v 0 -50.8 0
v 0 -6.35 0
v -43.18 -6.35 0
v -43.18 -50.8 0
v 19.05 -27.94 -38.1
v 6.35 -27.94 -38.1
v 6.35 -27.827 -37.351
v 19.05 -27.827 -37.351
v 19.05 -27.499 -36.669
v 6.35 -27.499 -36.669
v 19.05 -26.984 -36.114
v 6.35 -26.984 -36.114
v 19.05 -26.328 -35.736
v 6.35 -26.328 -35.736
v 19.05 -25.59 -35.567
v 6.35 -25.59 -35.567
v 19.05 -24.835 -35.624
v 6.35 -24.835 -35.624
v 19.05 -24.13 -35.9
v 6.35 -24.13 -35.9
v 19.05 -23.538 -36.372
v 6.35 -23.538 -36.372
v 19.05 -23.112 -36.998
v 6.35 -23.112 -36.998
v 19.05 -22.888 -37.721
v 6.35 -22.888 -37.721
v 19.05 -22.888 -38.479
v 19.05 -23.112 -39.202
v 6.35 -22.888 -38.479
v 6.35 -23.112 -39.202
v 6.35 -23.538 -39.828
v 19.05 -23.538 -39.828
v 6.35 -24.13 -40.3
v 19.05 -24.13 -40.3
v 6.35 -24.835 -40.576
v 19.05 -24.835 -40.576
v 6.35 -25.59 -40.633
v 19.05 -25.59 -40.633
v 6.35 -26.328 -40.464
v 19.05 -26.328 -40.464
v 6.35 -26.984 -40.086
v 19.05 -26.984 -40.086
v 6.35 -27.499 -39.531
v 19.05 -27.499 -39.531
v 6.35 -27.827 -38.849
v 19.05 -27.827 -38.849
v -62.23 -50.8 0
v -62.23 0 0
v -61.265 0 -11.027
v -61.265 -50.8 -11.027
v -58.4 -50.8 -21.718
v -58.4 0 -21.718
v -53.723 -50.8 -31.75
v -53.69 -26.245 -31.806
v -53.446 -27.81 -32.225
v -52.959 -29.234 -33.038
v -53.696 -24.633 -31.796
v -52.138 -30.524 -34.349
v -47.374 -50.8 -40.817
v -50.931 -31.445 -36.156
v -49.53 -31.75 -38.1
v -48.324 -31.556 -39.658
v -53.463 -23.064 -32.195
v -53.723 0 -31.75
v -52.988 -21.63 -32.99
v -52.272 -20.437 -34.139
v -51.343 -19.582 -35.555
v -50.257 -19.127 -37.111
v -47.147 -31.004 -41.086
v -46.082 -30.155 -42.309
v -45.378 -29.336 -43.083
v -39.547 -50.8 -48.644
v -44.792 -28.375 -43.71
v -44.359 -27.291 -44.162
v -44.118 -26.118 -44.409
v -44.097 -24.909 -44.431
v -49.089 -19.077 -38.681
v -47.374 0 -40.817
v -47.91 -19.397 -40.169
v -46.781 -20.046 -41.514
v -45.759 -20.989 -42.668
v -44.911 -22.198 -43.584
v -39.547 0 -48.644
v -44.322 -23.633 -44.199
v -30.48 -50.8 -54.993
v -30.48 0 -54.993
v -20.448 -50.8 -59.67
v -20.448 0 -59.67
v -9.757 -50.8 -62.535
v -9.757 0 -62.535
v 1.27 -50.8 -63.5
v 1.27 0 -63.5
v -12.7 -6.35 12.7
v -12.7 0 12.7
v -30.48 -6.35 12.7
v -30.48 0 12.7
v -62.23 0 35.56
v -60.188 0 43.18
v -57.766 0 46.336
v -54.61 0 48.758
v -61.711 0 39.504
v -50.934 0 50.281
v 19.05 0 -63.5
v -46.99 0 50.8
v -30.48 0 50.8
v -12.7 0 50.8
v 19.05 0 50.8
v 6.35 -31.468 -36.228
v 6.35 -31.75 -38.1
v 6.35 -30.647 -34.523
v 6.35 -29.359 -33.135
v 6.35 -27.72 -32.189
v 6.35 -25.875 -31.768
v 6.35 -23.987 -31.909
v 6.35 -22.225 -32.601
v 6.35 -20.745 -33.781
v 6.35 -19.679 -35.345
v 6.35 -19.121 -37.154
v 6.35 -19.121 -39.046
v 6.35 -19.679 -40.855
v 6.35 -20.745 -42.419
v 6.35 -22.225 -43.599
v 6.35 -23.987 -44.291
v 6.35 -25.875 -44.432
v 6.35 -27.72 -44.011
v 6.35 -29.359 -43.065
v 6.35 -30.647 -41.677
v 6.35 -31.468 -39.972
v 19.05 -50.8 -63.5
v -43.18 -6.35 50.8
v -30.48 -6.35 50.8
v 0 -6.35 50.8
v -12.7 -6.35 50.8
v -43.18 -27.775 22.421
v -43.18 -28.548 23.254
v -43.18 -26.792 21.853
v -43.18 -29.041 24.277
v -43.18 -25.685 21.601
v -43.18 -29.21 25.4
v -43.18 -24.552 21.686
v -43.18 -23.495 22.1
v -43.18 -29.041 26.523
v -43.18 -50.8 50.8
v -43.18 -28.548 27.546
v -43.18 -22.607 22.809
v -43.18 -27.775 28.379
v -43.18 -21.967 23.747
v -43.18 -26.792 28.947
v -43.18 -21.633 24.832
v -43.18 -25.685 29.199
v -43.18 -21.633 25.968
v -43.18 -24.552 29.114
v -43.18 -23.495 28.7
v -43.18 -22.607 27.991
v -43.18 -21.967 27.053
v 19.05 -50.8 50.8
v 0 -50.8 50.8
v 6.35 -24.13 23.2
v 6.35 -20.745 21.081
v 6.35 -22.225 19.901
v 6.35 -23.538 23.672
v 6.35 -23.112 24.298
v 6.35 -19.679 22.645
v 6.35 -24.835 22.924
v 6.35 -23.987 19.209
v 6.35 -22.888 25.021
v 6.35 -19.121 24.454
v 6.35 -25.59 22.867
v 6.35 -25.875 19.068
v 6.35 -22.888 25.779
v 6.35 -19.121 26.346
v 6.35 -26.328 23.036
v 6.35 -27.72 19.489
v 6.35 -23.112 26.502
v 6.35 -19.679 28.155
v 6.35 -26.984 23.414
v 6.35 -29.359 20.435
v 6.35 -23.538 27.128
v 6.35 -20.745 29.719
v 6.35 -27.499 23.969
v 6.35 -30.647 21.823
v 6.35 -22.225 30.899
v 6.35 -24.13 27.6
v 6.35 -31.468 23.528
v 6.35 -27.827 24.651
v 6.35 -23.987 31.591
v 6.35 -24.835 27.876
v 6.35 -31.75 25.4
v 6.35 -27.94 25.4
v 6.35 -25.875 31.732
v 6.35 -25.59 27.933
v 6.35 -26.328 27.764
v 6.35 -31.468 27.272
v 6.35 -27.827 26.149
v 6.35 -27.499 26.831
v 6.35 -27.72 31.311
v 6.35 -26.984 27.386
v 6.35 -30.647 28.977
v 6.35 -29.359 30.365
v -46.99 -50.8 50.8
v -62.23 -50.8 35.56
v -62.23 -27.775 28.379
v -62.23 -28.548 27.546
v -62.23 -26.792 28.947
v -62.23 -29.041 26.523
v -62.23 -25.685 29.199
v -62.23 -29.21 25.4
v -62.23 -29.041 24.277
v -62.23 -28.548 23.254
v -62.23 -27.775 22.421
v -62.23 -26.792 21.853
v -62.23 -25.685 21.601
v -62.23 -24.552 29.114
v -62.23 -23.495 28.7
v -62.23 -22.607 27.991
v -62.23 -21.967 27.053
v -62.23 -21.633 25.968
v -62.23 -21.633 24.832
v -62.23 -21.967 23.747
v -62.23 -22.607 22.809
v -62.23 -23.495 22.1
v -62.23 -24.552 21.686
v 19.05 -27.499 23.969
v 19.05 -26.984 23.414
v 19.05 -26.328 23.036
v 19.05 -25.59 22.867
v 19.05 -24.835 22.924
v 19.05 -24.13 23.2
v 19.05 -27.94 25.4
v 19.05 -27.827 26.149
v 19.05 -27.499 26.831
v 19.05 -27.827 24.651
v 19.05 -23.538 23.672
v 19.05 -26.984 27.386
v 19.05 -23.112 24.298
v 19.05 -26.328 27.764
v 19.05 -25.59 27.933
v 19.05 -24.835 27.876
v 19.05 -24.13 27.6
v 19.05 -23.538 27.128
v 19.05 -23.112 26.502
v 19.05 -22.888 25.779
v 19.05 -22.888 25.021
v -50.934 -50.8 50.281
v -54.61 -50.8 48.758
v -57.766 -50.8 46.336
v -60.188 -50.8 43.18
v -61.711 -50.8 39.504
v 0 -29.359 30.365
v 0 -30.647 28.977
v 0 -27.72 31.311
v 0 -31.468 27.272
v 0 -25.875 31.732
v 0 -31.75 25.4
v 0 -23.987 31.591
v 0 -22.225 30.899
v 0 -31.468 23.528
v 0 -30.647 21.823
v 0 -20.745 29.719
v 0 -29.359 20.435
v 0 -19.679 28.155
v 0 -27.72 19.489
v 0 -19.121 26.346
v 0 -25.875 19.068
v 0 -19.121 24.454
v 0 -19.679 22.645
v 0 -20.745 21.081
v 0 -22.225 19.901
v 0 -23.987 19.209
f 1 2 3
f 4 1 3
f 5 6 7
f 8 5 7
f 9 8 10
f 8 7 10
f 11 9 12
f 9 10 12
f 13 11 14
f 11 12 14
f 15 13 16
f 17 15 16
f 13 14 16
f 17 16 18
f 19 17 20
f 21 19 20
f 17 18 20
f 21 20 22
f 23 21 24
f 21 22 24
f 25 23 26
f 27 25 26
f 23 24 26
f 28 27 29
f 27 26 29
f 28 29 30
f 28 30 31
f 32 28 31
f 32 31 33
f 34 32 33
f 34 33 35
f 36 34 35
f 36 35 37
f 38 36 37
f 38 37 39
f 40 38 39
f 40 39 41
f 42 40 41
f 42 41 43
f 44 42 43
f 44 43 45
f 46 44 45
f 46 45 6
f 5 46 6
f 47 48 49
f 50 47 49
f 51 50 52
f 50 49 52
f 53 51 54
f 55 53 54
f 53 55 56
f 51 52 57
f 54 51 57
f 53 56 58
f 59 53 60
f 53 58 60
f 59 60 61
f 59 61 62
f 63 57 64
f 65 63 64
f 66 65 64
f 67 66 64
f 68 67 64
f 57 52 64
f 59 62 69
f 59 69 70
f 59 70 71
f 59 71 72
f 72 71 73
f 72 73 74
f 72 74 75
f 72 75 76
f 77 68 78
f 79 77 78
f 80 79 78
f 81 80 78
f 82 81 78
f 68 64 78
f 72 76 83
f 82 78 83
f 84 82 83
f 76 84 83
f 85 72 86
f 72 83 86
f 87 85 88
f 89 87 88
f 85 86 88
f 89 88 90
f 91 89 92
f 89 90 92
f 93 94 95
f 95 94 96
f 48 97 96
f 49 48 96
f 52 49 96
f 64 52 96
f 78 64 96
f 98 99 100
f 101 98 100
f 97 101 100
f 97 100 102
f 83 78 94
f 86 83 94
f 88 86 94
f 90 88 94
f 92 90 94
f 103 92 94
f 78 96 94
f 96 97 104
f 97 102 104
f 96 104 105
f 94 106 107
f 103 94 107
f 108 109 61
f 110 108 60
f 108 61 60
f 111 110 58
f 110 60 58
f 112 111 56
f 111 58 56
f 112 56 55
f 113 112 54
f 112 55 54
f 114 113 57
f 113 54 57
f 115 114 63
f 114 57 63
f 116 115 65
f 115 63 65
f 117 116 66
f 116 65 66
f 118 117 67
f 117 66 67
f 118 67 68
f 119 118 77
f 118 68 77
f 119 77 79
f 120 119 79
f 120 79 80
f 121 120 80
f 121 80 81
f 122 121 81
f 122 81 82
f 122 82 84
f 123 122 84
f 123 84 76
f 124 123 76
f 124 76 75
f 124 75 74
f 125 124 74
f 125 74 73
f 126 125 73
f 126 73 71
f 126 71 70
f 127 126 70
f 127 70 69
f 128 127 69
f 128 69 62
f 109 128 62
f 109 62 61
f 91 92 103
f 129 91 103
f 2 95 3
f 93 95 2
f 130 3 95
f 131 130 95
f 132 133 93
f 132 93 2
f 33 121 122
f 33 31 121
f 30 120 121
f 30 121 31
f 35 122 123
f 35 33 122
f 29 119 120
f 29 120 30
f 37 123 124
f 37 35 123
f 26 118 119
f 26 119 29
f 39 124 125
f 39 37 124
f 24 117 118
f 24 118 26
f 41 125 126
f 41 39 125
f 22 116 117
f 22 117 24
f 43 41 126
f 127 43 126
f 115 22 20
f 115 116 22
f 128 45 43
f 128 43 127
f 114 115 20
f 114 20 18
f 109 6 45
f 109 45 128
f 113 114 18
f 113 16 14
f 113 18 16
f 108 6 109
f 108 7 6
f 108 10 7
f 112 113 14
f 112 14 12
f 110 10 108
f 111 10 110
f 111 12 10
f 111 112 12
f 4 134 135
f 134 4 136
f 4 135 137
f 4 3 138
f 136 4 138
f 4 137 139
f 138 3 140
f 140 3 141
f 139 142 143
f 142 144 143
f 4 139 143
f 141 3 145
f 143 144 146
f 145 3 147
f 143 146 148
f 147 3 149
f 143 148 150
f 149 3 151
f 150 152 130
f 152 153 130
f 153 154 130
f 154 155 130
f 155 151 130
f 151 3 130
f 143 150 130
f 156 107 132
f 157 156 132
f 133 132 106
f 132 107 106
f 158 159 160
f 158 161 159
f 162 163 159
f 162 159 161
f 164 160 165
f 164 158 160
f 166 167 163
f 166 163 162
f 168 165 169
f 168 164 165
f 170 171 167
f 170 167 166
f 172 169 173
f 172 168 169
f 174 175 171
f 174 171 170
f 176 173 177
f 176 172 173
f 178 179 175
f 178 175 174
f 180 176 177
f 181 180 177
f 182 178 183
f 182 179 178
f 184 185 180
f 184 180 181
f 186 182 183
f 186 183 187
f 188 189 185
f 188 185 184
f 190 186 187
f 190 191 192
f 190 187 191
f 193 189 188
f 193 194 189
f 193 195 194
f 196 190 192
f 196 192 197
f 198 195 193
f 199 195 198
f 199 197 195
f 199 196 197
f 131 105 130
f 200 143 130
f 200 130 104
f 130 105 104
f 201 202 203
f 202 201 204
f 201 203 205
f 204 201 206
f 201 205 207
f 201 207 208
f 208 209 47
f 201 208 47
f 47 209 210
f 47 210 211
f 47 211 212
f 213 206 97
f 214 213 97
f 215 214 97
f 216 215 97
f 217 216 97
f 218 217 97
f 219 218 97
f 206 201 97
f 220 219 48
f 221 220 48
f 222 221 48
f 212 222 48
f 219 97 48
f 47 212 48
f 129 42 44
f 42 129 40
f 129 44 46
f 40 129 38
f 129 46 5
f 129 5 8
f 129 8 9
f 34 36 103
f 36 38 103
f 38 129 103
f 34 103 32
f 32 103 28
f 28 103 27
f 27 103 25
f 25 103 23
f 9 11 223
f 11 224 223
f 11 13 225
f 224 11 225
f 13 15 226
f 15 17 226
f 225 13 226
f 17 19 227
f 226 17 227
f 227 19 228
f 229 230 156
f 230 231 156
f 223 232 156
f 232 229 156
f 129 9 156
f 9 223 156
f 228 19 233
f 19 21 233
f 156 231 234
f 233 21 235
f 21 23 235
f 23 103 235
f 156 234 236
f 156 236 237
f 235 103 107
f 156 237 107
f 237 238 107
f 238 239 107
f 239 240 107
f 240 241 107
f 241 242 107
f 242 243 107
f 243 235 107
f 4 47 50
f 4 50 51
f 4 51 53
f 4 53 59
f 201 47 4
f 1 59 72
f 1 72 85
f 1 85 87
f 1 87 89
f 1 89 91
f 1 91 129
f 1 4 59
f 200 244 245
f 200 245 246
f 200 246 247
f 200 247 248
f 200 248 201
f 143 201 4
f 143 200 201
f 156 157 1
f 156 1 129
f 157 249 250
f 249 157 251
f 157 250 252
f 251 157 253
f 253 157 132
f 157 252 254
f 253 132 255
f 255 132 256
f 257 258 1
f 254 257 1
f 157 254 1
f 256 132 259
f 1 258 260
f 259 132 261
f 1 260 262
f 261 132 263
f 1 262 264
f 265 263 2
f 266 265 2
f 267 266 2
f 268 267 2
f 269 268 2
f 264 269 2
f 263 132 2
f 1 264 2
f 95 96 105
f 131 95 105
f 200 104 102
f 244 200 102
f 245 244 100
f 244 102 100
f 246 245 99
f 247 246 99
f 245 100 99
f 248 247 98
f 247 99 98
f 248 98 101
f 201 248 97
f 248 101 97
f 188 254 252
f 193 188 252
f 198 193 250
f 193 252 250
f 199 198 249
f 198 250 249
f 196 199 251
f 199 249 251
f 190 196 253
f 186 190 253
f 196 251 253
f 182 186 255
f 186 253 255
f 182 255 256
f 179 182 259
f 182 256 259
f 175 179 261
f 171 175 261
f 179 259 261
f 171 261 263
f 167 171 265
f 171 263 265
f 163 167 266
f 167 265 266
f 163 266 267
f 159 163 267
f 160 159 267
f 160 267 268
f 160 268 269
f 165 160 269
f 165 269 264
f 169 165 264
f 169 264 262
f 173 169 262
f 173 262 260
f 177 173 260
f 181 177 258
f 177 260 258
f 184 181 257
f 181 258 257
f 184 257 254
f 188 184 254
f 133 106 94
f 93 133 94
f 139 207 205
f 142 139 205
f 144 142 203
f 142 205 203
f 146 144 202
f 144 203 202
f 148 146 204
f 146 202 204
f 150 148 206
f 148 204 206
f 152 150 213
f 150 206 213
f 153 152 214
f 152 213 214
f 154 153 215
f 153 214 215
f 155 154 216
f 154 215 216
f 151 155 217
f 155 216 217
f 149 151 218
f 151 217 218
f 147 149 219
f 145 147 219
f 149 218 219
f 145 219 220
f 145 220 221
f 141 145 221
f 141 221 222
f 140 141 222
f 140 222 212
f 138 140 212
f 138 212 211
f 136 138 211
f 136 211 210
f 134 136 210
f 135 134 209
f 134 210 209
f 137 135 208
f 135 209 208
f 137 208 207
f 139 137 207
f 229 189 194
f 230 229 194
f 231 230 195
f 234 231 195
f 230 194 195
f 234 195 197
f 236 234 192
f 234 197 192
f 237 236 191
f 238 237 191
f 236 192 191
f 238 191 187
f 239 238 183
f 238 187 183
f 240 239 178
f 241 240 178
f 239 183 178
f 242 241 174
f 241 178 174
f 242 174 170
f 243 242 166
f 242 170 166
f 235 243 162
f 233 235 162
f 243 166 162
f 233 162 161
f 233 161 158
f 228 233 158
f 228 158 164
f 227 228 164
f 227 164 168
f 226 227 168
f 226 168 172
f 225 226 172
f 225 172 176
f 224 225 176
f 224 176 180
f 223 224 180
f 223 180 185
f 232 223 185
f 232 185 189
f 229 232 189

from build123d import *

# Parameters (mm, degrees)
F1_DEPTH  = 50.8
F2_DEPTH  = 6.35
F3_R      = 3.81
F4_DEPTH  = 19.05
F5_R      = 6.35
F6_DEPTH  = 6.35
F7_R      = 2.54
F8_DEPTH  = 12.701
F9_R      = 2.54
F10_DEPTH = 81.281
F9_R_2    = 6.35
F11_DEPTH = 68.58


with BuildPart() as f1:
    # F0 (on Front) → F1 (new body)
    with BuildSketch(Plane.XZ):
        with BuildLine():
            Line((0, 50.8), (0, 0))
            Line((0, 0), (-43.18, 0))
            Line((-43.18, 0), (-43.18, 50.8))
            Line((-43.18, 50.8), (-46.99, 50.8))
            ThreePointArc((-46.99, 50.8), (-57.766307, 46.336307), (-62.23, 35.56))
            Line((-62.23, 35.56), (-62.23, 0))
            ThreePointArc((-62.23, 0), (-43.631281, -44.901281), (1.27, -63.5))
            Line((1.27, -63.5), (19.05, -63.5))
            Line((19.05, -63.5), (19.05, 50.8))
            Line((19.05, 50.8), (0, 50.8))
        make_face()
    extrude(amount=F1_DEPTH)

    # F0 (on Front) → F2 (join)
    with BuildSketch(Plane.XZ):
        Polygon((-43.18, 0), (0, 0), (0, 50.8), (-12.7, 50.8), (-12.7, 12.7), (-30.48, 12.7), (-30.48, 50.8), (-43.18, 50.8), align=None)
        with BuildLine():
            Line((0, 50.8), (0, 0))
            Line((0, 0), (-43.18, 0))
            Line((-43.18, 0), (-43.18, 50.8))
            Line((-43.18, 50.8), (-46.99, 50.8))
            ThreePointArc((-46.99, 50.8), (-57.766307, 46.336307), (-62.23, 35.56))
            Line((-62.23, 35.56), (-62.23, 0))
            ThreePointArc((-62.23, 0), (-43.631281, -44.901281), (1.27, -63.5))
            Line((1.27, -63.5), (19.05, -63.5))
            Line((19.05, -63.5), (19.05, 50.8))
            Line((19.05, 50.8), (0, 50.8))
        make_face()
    extrude(amount=F2_DEPTH)

    # F3 (on face) → F4 (cut, through all)
    with BuildSketch(Plane(origin=(-62.23, 0, 0), x_dir=(0, -1, 0), z_dir=(-1, 0, 0))):
        with Locations((25.4, 25.4)):
            Circle(F3_R)
    extrude(amount=-F4_DEPTH, mode=Mode.SUBTRACT)

    # F5 (on face) → F6 (cut)
    with BuildSketch(Plane(origin=(0, 0, 0), x_dir=(0, -1, 0), z_dir=(-1, 0, 0))):
        with Locations((25.4, 25.4)):
            Circle(F5_R)
    extrude(amount=-F6_DEPTH, mode=Mode.SUBTRACT)

    # F7 (on face) → F8 (cut, through all)
    with BuildSketch(Plane(origin=(6.35, 0, 0), x_dir=(0, -1, 0), z_dir=(-1, 0, 0))):
        with Locations((25.4, 25.4)):
            Circle(F7_R)
    extrude(amount=-F8_DEPTH, mode=Mode.SUBTRACT)

    # F9 (on face) → F10 (cut, through all)
    with BuildSketch(Plane(origin=(-62.23, 0, 0), x_dir=(0, -1, 0), z_dir=(-1, 0, 0))):
        with Locations((25.4, -38.1)):
            Circle(F9_R)
    extrude(amount=-F10_DEPTH, mode=Mode.SUBTRACT)

    # F9 (on face) → F11 (cut)
    with BuildSketch(Plane(origin=(-62.23, 0, 0), x_dir=(0, -1, 0), z_dir=(-1, 0, 0))):
        with Locations((25.4, -38.1)):
            Circle(F9_R_2)
        with Locations((25.4, -38.1)):
            Circle(F9_R, mode=Mode.SUBTRACT)
    extrude(amount=-F11_DEPTH, mode=Mode.SUBTRACT)


solid = f1.part
